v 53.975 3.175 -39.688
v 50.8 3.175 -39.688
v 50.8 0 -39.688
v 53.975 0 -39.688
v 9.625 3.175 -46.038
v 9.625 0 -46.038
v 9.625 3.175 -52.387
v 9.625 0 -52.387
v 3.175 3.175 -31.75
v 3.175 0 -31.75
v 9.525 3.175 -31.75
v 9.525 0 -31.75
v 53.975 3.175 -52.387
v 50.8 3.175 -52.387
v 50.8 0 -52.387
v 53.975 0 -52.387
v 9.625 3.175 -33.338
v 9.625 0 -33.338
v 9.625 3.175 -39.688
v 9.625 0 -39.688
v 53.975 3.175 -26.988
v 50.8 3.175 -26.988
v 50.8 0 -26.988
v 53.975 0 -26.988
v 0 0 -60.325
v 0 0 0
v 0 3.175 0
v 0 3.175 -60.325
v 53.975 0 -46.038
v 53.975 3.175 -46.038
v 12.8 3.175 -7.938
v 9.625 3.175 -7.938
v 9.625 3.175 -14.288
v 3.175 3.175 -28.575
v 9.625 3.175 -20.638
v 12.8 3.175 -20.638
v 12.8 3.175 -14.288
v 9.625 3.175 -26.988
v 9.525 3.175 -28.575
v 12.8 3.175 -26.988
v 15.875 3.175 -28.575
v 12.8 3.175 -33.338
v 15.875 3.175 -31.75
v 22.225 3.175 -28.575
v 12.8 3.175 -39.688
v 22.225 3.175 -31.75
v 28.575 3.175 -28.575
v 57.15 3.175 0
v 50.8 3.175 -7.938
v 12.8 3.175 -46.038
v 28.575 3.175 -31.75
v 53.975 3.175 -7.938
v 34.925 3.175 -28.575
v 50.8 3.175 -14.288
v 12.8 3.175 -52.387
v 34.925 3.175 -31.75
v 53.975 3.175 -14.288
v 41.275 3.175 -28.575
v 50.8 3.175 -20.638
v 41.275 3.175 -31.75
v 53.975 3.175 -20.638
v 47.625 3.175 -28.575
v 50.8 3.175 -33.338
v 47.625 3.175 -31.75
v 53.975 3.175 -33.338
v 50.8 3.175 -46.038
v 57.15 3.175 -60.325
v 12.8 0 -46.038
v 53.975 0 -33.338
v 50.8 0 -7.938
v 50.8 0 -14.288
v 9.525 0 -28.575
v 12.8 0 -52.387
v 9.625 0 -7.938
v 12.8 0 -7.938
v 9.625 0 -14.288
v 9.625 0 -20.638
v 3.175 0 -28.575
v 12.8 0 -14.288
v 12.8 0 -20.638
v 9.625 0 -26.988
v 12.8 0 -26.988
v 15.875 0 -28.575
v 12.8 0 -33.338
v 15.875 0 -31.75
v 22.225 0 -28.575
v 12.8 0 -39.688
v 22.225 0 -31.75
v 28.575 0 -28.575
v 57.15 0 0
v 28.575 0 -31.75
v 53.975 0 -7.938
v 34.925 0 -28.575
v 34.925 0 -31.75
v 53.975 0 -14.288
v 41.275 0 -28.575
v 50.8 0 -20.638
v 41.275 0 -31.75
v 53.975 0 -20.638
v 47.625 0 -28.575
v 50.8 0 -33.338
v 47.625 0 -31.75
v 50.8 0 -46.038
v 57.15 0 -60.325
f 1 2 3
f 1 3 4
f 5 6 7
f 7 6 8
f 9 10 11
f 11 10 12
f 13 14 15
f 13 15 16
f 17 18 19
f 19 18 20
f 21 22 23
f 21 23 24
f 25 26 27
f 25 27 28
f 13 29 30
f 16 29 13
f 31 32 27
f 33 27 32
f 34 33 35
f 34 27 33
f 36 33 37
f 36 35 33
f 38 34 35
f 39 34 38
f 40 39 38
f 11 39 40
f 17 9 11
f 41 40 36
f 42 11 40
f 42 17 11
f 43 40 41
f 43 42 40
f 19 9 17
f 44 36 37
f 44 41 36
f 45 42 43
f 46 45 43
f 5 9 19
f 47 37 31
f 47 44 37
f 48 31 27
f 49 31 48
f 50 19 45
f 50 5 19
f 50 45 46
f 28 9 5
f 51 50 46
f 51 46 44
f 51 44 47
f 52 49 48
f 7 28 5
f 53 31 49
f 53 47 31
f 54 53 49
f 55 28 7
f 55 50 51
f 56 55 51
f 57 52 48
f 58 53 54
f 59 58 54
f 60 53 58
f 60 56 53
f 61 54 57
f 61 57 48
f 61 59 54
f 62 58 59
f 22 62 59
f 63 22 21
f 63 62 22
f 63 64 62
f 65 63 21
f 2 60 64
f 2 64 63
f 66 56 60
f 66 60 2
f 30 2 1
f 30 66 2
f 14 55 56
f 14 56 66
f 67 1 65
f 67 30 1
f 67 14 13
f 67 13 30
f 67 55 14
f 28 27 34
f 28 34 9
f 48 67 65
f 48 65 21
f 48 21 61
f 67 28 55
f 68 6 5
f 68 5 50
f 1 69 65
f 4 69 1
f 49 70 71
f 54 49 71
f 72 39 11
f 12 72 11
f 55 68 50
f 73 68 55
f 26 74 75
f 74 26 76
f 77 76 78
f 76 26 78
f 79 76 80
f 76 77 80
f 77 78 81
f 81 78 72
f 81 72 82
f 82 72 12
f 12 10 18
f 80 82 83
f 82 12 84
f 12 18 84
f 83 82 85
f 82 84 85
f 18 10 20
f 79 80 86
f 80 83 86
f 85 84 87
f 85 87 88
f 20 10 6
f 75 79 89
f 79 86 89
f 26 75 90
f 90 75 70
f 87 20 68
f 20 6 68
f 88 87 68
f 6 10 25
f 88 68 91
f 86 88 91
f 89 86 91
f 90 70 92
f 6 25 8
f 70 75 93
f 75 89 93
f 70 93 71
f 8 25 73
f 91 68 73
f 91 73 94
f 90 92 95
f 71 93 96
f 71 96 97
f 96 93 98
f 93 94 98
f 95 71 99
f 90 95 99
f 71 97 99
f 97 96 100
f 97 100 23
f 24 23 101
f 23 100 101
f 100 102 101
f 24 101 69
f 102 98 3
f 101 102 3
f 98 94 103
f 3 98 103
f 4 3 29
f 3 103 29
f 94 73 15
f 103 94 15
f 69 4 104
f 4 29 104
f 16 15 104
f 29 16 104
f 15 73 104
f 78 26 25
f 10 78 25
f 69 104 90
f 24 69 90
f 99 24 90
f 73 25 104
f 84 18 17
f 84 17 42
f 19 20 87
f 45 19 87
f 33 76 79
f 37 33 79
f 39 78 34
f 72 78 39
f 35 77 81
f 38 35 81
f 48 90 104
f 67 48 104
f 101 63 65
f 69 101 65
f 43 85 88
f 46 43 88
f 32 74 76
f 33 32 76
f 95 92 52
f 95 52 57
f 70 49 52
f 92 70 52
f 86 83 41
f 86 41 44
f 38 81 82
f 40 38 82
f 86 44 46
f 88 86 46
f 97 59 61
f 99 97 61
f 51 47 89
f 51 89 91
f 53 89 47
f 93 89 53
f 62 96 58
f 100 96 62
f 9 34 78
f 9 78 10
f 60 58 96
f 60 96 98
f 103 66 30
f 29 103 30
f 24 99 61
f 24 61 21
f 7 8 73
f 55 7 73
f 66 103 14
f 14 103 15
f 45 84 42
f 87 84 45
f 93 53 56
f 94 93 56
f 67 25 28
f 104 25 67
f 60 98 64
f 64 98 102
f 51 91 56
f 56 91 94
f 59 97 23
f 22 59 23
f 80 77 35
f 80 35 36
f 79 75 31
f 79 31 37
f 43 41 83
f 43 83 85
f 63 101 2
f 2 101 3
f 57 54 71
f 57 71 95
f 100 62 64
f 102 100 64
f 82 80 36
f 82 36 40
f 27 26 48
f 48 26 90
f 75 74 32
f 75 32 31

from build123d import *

# Parameters (mm, degrees)
SKETCH1_W           = 57.15
SKETCH1_H           = 60.325
SKETCH1_W_2         = 6.35
SKETCH1_H_2         = 3.175
SKETCH1_W_3         = 3.175
SKETCH1_H_3         = 6.35
BOSS_EXTRUDE1_DEPTH = 3.175


with BuildPart() as part:
    # Sketch1 → Boss-Extrude1 (new body)
    with BuildSketch(Plane(origin=(0, 0, 0), x_dir=(1, 0, 0), z_dir=(0, 1, 0))):
        with Locations((28.575, 30.1625)):
            Rectangle(SKETCH1_W, SKETCH1_H)
        with Locations((44.45, 30.1625)):
            Rectangle(SKETCH1_W_2, SKETCH1_H_2, mode=Mode.SUBTRACT)
        with Locations((52.3875, 36.5125)):
            Rectangle(SKETCH1_W_3, SKETCH1_H_3, mode=Mode.SUBTRACT)
        with Locations((52.3875, 23.8125)):
            Rectangle(SKETCH1_W_3, SKETCH1_H_3, mode=Mode.SUBTRACT)
        with Locations((52.3875, 49.2125)):
            Rectangle(SKETCH1_W_3, SKETCH1_H_3, mode=Mode.SUBTRACT)
        with Locations((52.3875, 11.1125)):
            Rectangle(SKETCH1_W_3, SKETCH1_H_3, mode=Mode.SUBTRACT)
        with Locations((11.2125, 11.1125)):
            Rectangle(SKETCH1_W_3, SKETCH1_H_3, mode=Mode.SUBTRACT)
        with Locations((11.2125, 49.2125)):
            Rectangle(SKETCH1_W_3, SKETCH1_H_3, mode=Mode.SUBTRACT)
        with Locations((11.2125, 36.5125)):
            Rectangle(SKETCH1_W_3, SKETCH1_H_3, mode=Mode.SUBTRACT)
        with Locations((11.2125, 23.8125)):
            Rectangle(SKETCH1_W_3, SKETCH1_H_3, mode=Mode.SUBTRACT)
        with Locations((31.75, 30.1625)):
            Rectangle(SKETCH1_W_2, SKETCH1_H_2, mode=Mode.SUBTRACT)
        with Locations((19.05, 30.1625)):
            Rectangle(SKETCH1_W_2, SKETCH1_H_2, mode=Mode.SUBTRACT)
        with Locations((6.35, 30.1625)):
            Rectangle(SKETCH1_W_2, SKETCH1_H_2, mode=Mode.SUBTRACT)
    extrude(amount=BOSS_EXTRUDE1_DEPTH)


solid = part.part
